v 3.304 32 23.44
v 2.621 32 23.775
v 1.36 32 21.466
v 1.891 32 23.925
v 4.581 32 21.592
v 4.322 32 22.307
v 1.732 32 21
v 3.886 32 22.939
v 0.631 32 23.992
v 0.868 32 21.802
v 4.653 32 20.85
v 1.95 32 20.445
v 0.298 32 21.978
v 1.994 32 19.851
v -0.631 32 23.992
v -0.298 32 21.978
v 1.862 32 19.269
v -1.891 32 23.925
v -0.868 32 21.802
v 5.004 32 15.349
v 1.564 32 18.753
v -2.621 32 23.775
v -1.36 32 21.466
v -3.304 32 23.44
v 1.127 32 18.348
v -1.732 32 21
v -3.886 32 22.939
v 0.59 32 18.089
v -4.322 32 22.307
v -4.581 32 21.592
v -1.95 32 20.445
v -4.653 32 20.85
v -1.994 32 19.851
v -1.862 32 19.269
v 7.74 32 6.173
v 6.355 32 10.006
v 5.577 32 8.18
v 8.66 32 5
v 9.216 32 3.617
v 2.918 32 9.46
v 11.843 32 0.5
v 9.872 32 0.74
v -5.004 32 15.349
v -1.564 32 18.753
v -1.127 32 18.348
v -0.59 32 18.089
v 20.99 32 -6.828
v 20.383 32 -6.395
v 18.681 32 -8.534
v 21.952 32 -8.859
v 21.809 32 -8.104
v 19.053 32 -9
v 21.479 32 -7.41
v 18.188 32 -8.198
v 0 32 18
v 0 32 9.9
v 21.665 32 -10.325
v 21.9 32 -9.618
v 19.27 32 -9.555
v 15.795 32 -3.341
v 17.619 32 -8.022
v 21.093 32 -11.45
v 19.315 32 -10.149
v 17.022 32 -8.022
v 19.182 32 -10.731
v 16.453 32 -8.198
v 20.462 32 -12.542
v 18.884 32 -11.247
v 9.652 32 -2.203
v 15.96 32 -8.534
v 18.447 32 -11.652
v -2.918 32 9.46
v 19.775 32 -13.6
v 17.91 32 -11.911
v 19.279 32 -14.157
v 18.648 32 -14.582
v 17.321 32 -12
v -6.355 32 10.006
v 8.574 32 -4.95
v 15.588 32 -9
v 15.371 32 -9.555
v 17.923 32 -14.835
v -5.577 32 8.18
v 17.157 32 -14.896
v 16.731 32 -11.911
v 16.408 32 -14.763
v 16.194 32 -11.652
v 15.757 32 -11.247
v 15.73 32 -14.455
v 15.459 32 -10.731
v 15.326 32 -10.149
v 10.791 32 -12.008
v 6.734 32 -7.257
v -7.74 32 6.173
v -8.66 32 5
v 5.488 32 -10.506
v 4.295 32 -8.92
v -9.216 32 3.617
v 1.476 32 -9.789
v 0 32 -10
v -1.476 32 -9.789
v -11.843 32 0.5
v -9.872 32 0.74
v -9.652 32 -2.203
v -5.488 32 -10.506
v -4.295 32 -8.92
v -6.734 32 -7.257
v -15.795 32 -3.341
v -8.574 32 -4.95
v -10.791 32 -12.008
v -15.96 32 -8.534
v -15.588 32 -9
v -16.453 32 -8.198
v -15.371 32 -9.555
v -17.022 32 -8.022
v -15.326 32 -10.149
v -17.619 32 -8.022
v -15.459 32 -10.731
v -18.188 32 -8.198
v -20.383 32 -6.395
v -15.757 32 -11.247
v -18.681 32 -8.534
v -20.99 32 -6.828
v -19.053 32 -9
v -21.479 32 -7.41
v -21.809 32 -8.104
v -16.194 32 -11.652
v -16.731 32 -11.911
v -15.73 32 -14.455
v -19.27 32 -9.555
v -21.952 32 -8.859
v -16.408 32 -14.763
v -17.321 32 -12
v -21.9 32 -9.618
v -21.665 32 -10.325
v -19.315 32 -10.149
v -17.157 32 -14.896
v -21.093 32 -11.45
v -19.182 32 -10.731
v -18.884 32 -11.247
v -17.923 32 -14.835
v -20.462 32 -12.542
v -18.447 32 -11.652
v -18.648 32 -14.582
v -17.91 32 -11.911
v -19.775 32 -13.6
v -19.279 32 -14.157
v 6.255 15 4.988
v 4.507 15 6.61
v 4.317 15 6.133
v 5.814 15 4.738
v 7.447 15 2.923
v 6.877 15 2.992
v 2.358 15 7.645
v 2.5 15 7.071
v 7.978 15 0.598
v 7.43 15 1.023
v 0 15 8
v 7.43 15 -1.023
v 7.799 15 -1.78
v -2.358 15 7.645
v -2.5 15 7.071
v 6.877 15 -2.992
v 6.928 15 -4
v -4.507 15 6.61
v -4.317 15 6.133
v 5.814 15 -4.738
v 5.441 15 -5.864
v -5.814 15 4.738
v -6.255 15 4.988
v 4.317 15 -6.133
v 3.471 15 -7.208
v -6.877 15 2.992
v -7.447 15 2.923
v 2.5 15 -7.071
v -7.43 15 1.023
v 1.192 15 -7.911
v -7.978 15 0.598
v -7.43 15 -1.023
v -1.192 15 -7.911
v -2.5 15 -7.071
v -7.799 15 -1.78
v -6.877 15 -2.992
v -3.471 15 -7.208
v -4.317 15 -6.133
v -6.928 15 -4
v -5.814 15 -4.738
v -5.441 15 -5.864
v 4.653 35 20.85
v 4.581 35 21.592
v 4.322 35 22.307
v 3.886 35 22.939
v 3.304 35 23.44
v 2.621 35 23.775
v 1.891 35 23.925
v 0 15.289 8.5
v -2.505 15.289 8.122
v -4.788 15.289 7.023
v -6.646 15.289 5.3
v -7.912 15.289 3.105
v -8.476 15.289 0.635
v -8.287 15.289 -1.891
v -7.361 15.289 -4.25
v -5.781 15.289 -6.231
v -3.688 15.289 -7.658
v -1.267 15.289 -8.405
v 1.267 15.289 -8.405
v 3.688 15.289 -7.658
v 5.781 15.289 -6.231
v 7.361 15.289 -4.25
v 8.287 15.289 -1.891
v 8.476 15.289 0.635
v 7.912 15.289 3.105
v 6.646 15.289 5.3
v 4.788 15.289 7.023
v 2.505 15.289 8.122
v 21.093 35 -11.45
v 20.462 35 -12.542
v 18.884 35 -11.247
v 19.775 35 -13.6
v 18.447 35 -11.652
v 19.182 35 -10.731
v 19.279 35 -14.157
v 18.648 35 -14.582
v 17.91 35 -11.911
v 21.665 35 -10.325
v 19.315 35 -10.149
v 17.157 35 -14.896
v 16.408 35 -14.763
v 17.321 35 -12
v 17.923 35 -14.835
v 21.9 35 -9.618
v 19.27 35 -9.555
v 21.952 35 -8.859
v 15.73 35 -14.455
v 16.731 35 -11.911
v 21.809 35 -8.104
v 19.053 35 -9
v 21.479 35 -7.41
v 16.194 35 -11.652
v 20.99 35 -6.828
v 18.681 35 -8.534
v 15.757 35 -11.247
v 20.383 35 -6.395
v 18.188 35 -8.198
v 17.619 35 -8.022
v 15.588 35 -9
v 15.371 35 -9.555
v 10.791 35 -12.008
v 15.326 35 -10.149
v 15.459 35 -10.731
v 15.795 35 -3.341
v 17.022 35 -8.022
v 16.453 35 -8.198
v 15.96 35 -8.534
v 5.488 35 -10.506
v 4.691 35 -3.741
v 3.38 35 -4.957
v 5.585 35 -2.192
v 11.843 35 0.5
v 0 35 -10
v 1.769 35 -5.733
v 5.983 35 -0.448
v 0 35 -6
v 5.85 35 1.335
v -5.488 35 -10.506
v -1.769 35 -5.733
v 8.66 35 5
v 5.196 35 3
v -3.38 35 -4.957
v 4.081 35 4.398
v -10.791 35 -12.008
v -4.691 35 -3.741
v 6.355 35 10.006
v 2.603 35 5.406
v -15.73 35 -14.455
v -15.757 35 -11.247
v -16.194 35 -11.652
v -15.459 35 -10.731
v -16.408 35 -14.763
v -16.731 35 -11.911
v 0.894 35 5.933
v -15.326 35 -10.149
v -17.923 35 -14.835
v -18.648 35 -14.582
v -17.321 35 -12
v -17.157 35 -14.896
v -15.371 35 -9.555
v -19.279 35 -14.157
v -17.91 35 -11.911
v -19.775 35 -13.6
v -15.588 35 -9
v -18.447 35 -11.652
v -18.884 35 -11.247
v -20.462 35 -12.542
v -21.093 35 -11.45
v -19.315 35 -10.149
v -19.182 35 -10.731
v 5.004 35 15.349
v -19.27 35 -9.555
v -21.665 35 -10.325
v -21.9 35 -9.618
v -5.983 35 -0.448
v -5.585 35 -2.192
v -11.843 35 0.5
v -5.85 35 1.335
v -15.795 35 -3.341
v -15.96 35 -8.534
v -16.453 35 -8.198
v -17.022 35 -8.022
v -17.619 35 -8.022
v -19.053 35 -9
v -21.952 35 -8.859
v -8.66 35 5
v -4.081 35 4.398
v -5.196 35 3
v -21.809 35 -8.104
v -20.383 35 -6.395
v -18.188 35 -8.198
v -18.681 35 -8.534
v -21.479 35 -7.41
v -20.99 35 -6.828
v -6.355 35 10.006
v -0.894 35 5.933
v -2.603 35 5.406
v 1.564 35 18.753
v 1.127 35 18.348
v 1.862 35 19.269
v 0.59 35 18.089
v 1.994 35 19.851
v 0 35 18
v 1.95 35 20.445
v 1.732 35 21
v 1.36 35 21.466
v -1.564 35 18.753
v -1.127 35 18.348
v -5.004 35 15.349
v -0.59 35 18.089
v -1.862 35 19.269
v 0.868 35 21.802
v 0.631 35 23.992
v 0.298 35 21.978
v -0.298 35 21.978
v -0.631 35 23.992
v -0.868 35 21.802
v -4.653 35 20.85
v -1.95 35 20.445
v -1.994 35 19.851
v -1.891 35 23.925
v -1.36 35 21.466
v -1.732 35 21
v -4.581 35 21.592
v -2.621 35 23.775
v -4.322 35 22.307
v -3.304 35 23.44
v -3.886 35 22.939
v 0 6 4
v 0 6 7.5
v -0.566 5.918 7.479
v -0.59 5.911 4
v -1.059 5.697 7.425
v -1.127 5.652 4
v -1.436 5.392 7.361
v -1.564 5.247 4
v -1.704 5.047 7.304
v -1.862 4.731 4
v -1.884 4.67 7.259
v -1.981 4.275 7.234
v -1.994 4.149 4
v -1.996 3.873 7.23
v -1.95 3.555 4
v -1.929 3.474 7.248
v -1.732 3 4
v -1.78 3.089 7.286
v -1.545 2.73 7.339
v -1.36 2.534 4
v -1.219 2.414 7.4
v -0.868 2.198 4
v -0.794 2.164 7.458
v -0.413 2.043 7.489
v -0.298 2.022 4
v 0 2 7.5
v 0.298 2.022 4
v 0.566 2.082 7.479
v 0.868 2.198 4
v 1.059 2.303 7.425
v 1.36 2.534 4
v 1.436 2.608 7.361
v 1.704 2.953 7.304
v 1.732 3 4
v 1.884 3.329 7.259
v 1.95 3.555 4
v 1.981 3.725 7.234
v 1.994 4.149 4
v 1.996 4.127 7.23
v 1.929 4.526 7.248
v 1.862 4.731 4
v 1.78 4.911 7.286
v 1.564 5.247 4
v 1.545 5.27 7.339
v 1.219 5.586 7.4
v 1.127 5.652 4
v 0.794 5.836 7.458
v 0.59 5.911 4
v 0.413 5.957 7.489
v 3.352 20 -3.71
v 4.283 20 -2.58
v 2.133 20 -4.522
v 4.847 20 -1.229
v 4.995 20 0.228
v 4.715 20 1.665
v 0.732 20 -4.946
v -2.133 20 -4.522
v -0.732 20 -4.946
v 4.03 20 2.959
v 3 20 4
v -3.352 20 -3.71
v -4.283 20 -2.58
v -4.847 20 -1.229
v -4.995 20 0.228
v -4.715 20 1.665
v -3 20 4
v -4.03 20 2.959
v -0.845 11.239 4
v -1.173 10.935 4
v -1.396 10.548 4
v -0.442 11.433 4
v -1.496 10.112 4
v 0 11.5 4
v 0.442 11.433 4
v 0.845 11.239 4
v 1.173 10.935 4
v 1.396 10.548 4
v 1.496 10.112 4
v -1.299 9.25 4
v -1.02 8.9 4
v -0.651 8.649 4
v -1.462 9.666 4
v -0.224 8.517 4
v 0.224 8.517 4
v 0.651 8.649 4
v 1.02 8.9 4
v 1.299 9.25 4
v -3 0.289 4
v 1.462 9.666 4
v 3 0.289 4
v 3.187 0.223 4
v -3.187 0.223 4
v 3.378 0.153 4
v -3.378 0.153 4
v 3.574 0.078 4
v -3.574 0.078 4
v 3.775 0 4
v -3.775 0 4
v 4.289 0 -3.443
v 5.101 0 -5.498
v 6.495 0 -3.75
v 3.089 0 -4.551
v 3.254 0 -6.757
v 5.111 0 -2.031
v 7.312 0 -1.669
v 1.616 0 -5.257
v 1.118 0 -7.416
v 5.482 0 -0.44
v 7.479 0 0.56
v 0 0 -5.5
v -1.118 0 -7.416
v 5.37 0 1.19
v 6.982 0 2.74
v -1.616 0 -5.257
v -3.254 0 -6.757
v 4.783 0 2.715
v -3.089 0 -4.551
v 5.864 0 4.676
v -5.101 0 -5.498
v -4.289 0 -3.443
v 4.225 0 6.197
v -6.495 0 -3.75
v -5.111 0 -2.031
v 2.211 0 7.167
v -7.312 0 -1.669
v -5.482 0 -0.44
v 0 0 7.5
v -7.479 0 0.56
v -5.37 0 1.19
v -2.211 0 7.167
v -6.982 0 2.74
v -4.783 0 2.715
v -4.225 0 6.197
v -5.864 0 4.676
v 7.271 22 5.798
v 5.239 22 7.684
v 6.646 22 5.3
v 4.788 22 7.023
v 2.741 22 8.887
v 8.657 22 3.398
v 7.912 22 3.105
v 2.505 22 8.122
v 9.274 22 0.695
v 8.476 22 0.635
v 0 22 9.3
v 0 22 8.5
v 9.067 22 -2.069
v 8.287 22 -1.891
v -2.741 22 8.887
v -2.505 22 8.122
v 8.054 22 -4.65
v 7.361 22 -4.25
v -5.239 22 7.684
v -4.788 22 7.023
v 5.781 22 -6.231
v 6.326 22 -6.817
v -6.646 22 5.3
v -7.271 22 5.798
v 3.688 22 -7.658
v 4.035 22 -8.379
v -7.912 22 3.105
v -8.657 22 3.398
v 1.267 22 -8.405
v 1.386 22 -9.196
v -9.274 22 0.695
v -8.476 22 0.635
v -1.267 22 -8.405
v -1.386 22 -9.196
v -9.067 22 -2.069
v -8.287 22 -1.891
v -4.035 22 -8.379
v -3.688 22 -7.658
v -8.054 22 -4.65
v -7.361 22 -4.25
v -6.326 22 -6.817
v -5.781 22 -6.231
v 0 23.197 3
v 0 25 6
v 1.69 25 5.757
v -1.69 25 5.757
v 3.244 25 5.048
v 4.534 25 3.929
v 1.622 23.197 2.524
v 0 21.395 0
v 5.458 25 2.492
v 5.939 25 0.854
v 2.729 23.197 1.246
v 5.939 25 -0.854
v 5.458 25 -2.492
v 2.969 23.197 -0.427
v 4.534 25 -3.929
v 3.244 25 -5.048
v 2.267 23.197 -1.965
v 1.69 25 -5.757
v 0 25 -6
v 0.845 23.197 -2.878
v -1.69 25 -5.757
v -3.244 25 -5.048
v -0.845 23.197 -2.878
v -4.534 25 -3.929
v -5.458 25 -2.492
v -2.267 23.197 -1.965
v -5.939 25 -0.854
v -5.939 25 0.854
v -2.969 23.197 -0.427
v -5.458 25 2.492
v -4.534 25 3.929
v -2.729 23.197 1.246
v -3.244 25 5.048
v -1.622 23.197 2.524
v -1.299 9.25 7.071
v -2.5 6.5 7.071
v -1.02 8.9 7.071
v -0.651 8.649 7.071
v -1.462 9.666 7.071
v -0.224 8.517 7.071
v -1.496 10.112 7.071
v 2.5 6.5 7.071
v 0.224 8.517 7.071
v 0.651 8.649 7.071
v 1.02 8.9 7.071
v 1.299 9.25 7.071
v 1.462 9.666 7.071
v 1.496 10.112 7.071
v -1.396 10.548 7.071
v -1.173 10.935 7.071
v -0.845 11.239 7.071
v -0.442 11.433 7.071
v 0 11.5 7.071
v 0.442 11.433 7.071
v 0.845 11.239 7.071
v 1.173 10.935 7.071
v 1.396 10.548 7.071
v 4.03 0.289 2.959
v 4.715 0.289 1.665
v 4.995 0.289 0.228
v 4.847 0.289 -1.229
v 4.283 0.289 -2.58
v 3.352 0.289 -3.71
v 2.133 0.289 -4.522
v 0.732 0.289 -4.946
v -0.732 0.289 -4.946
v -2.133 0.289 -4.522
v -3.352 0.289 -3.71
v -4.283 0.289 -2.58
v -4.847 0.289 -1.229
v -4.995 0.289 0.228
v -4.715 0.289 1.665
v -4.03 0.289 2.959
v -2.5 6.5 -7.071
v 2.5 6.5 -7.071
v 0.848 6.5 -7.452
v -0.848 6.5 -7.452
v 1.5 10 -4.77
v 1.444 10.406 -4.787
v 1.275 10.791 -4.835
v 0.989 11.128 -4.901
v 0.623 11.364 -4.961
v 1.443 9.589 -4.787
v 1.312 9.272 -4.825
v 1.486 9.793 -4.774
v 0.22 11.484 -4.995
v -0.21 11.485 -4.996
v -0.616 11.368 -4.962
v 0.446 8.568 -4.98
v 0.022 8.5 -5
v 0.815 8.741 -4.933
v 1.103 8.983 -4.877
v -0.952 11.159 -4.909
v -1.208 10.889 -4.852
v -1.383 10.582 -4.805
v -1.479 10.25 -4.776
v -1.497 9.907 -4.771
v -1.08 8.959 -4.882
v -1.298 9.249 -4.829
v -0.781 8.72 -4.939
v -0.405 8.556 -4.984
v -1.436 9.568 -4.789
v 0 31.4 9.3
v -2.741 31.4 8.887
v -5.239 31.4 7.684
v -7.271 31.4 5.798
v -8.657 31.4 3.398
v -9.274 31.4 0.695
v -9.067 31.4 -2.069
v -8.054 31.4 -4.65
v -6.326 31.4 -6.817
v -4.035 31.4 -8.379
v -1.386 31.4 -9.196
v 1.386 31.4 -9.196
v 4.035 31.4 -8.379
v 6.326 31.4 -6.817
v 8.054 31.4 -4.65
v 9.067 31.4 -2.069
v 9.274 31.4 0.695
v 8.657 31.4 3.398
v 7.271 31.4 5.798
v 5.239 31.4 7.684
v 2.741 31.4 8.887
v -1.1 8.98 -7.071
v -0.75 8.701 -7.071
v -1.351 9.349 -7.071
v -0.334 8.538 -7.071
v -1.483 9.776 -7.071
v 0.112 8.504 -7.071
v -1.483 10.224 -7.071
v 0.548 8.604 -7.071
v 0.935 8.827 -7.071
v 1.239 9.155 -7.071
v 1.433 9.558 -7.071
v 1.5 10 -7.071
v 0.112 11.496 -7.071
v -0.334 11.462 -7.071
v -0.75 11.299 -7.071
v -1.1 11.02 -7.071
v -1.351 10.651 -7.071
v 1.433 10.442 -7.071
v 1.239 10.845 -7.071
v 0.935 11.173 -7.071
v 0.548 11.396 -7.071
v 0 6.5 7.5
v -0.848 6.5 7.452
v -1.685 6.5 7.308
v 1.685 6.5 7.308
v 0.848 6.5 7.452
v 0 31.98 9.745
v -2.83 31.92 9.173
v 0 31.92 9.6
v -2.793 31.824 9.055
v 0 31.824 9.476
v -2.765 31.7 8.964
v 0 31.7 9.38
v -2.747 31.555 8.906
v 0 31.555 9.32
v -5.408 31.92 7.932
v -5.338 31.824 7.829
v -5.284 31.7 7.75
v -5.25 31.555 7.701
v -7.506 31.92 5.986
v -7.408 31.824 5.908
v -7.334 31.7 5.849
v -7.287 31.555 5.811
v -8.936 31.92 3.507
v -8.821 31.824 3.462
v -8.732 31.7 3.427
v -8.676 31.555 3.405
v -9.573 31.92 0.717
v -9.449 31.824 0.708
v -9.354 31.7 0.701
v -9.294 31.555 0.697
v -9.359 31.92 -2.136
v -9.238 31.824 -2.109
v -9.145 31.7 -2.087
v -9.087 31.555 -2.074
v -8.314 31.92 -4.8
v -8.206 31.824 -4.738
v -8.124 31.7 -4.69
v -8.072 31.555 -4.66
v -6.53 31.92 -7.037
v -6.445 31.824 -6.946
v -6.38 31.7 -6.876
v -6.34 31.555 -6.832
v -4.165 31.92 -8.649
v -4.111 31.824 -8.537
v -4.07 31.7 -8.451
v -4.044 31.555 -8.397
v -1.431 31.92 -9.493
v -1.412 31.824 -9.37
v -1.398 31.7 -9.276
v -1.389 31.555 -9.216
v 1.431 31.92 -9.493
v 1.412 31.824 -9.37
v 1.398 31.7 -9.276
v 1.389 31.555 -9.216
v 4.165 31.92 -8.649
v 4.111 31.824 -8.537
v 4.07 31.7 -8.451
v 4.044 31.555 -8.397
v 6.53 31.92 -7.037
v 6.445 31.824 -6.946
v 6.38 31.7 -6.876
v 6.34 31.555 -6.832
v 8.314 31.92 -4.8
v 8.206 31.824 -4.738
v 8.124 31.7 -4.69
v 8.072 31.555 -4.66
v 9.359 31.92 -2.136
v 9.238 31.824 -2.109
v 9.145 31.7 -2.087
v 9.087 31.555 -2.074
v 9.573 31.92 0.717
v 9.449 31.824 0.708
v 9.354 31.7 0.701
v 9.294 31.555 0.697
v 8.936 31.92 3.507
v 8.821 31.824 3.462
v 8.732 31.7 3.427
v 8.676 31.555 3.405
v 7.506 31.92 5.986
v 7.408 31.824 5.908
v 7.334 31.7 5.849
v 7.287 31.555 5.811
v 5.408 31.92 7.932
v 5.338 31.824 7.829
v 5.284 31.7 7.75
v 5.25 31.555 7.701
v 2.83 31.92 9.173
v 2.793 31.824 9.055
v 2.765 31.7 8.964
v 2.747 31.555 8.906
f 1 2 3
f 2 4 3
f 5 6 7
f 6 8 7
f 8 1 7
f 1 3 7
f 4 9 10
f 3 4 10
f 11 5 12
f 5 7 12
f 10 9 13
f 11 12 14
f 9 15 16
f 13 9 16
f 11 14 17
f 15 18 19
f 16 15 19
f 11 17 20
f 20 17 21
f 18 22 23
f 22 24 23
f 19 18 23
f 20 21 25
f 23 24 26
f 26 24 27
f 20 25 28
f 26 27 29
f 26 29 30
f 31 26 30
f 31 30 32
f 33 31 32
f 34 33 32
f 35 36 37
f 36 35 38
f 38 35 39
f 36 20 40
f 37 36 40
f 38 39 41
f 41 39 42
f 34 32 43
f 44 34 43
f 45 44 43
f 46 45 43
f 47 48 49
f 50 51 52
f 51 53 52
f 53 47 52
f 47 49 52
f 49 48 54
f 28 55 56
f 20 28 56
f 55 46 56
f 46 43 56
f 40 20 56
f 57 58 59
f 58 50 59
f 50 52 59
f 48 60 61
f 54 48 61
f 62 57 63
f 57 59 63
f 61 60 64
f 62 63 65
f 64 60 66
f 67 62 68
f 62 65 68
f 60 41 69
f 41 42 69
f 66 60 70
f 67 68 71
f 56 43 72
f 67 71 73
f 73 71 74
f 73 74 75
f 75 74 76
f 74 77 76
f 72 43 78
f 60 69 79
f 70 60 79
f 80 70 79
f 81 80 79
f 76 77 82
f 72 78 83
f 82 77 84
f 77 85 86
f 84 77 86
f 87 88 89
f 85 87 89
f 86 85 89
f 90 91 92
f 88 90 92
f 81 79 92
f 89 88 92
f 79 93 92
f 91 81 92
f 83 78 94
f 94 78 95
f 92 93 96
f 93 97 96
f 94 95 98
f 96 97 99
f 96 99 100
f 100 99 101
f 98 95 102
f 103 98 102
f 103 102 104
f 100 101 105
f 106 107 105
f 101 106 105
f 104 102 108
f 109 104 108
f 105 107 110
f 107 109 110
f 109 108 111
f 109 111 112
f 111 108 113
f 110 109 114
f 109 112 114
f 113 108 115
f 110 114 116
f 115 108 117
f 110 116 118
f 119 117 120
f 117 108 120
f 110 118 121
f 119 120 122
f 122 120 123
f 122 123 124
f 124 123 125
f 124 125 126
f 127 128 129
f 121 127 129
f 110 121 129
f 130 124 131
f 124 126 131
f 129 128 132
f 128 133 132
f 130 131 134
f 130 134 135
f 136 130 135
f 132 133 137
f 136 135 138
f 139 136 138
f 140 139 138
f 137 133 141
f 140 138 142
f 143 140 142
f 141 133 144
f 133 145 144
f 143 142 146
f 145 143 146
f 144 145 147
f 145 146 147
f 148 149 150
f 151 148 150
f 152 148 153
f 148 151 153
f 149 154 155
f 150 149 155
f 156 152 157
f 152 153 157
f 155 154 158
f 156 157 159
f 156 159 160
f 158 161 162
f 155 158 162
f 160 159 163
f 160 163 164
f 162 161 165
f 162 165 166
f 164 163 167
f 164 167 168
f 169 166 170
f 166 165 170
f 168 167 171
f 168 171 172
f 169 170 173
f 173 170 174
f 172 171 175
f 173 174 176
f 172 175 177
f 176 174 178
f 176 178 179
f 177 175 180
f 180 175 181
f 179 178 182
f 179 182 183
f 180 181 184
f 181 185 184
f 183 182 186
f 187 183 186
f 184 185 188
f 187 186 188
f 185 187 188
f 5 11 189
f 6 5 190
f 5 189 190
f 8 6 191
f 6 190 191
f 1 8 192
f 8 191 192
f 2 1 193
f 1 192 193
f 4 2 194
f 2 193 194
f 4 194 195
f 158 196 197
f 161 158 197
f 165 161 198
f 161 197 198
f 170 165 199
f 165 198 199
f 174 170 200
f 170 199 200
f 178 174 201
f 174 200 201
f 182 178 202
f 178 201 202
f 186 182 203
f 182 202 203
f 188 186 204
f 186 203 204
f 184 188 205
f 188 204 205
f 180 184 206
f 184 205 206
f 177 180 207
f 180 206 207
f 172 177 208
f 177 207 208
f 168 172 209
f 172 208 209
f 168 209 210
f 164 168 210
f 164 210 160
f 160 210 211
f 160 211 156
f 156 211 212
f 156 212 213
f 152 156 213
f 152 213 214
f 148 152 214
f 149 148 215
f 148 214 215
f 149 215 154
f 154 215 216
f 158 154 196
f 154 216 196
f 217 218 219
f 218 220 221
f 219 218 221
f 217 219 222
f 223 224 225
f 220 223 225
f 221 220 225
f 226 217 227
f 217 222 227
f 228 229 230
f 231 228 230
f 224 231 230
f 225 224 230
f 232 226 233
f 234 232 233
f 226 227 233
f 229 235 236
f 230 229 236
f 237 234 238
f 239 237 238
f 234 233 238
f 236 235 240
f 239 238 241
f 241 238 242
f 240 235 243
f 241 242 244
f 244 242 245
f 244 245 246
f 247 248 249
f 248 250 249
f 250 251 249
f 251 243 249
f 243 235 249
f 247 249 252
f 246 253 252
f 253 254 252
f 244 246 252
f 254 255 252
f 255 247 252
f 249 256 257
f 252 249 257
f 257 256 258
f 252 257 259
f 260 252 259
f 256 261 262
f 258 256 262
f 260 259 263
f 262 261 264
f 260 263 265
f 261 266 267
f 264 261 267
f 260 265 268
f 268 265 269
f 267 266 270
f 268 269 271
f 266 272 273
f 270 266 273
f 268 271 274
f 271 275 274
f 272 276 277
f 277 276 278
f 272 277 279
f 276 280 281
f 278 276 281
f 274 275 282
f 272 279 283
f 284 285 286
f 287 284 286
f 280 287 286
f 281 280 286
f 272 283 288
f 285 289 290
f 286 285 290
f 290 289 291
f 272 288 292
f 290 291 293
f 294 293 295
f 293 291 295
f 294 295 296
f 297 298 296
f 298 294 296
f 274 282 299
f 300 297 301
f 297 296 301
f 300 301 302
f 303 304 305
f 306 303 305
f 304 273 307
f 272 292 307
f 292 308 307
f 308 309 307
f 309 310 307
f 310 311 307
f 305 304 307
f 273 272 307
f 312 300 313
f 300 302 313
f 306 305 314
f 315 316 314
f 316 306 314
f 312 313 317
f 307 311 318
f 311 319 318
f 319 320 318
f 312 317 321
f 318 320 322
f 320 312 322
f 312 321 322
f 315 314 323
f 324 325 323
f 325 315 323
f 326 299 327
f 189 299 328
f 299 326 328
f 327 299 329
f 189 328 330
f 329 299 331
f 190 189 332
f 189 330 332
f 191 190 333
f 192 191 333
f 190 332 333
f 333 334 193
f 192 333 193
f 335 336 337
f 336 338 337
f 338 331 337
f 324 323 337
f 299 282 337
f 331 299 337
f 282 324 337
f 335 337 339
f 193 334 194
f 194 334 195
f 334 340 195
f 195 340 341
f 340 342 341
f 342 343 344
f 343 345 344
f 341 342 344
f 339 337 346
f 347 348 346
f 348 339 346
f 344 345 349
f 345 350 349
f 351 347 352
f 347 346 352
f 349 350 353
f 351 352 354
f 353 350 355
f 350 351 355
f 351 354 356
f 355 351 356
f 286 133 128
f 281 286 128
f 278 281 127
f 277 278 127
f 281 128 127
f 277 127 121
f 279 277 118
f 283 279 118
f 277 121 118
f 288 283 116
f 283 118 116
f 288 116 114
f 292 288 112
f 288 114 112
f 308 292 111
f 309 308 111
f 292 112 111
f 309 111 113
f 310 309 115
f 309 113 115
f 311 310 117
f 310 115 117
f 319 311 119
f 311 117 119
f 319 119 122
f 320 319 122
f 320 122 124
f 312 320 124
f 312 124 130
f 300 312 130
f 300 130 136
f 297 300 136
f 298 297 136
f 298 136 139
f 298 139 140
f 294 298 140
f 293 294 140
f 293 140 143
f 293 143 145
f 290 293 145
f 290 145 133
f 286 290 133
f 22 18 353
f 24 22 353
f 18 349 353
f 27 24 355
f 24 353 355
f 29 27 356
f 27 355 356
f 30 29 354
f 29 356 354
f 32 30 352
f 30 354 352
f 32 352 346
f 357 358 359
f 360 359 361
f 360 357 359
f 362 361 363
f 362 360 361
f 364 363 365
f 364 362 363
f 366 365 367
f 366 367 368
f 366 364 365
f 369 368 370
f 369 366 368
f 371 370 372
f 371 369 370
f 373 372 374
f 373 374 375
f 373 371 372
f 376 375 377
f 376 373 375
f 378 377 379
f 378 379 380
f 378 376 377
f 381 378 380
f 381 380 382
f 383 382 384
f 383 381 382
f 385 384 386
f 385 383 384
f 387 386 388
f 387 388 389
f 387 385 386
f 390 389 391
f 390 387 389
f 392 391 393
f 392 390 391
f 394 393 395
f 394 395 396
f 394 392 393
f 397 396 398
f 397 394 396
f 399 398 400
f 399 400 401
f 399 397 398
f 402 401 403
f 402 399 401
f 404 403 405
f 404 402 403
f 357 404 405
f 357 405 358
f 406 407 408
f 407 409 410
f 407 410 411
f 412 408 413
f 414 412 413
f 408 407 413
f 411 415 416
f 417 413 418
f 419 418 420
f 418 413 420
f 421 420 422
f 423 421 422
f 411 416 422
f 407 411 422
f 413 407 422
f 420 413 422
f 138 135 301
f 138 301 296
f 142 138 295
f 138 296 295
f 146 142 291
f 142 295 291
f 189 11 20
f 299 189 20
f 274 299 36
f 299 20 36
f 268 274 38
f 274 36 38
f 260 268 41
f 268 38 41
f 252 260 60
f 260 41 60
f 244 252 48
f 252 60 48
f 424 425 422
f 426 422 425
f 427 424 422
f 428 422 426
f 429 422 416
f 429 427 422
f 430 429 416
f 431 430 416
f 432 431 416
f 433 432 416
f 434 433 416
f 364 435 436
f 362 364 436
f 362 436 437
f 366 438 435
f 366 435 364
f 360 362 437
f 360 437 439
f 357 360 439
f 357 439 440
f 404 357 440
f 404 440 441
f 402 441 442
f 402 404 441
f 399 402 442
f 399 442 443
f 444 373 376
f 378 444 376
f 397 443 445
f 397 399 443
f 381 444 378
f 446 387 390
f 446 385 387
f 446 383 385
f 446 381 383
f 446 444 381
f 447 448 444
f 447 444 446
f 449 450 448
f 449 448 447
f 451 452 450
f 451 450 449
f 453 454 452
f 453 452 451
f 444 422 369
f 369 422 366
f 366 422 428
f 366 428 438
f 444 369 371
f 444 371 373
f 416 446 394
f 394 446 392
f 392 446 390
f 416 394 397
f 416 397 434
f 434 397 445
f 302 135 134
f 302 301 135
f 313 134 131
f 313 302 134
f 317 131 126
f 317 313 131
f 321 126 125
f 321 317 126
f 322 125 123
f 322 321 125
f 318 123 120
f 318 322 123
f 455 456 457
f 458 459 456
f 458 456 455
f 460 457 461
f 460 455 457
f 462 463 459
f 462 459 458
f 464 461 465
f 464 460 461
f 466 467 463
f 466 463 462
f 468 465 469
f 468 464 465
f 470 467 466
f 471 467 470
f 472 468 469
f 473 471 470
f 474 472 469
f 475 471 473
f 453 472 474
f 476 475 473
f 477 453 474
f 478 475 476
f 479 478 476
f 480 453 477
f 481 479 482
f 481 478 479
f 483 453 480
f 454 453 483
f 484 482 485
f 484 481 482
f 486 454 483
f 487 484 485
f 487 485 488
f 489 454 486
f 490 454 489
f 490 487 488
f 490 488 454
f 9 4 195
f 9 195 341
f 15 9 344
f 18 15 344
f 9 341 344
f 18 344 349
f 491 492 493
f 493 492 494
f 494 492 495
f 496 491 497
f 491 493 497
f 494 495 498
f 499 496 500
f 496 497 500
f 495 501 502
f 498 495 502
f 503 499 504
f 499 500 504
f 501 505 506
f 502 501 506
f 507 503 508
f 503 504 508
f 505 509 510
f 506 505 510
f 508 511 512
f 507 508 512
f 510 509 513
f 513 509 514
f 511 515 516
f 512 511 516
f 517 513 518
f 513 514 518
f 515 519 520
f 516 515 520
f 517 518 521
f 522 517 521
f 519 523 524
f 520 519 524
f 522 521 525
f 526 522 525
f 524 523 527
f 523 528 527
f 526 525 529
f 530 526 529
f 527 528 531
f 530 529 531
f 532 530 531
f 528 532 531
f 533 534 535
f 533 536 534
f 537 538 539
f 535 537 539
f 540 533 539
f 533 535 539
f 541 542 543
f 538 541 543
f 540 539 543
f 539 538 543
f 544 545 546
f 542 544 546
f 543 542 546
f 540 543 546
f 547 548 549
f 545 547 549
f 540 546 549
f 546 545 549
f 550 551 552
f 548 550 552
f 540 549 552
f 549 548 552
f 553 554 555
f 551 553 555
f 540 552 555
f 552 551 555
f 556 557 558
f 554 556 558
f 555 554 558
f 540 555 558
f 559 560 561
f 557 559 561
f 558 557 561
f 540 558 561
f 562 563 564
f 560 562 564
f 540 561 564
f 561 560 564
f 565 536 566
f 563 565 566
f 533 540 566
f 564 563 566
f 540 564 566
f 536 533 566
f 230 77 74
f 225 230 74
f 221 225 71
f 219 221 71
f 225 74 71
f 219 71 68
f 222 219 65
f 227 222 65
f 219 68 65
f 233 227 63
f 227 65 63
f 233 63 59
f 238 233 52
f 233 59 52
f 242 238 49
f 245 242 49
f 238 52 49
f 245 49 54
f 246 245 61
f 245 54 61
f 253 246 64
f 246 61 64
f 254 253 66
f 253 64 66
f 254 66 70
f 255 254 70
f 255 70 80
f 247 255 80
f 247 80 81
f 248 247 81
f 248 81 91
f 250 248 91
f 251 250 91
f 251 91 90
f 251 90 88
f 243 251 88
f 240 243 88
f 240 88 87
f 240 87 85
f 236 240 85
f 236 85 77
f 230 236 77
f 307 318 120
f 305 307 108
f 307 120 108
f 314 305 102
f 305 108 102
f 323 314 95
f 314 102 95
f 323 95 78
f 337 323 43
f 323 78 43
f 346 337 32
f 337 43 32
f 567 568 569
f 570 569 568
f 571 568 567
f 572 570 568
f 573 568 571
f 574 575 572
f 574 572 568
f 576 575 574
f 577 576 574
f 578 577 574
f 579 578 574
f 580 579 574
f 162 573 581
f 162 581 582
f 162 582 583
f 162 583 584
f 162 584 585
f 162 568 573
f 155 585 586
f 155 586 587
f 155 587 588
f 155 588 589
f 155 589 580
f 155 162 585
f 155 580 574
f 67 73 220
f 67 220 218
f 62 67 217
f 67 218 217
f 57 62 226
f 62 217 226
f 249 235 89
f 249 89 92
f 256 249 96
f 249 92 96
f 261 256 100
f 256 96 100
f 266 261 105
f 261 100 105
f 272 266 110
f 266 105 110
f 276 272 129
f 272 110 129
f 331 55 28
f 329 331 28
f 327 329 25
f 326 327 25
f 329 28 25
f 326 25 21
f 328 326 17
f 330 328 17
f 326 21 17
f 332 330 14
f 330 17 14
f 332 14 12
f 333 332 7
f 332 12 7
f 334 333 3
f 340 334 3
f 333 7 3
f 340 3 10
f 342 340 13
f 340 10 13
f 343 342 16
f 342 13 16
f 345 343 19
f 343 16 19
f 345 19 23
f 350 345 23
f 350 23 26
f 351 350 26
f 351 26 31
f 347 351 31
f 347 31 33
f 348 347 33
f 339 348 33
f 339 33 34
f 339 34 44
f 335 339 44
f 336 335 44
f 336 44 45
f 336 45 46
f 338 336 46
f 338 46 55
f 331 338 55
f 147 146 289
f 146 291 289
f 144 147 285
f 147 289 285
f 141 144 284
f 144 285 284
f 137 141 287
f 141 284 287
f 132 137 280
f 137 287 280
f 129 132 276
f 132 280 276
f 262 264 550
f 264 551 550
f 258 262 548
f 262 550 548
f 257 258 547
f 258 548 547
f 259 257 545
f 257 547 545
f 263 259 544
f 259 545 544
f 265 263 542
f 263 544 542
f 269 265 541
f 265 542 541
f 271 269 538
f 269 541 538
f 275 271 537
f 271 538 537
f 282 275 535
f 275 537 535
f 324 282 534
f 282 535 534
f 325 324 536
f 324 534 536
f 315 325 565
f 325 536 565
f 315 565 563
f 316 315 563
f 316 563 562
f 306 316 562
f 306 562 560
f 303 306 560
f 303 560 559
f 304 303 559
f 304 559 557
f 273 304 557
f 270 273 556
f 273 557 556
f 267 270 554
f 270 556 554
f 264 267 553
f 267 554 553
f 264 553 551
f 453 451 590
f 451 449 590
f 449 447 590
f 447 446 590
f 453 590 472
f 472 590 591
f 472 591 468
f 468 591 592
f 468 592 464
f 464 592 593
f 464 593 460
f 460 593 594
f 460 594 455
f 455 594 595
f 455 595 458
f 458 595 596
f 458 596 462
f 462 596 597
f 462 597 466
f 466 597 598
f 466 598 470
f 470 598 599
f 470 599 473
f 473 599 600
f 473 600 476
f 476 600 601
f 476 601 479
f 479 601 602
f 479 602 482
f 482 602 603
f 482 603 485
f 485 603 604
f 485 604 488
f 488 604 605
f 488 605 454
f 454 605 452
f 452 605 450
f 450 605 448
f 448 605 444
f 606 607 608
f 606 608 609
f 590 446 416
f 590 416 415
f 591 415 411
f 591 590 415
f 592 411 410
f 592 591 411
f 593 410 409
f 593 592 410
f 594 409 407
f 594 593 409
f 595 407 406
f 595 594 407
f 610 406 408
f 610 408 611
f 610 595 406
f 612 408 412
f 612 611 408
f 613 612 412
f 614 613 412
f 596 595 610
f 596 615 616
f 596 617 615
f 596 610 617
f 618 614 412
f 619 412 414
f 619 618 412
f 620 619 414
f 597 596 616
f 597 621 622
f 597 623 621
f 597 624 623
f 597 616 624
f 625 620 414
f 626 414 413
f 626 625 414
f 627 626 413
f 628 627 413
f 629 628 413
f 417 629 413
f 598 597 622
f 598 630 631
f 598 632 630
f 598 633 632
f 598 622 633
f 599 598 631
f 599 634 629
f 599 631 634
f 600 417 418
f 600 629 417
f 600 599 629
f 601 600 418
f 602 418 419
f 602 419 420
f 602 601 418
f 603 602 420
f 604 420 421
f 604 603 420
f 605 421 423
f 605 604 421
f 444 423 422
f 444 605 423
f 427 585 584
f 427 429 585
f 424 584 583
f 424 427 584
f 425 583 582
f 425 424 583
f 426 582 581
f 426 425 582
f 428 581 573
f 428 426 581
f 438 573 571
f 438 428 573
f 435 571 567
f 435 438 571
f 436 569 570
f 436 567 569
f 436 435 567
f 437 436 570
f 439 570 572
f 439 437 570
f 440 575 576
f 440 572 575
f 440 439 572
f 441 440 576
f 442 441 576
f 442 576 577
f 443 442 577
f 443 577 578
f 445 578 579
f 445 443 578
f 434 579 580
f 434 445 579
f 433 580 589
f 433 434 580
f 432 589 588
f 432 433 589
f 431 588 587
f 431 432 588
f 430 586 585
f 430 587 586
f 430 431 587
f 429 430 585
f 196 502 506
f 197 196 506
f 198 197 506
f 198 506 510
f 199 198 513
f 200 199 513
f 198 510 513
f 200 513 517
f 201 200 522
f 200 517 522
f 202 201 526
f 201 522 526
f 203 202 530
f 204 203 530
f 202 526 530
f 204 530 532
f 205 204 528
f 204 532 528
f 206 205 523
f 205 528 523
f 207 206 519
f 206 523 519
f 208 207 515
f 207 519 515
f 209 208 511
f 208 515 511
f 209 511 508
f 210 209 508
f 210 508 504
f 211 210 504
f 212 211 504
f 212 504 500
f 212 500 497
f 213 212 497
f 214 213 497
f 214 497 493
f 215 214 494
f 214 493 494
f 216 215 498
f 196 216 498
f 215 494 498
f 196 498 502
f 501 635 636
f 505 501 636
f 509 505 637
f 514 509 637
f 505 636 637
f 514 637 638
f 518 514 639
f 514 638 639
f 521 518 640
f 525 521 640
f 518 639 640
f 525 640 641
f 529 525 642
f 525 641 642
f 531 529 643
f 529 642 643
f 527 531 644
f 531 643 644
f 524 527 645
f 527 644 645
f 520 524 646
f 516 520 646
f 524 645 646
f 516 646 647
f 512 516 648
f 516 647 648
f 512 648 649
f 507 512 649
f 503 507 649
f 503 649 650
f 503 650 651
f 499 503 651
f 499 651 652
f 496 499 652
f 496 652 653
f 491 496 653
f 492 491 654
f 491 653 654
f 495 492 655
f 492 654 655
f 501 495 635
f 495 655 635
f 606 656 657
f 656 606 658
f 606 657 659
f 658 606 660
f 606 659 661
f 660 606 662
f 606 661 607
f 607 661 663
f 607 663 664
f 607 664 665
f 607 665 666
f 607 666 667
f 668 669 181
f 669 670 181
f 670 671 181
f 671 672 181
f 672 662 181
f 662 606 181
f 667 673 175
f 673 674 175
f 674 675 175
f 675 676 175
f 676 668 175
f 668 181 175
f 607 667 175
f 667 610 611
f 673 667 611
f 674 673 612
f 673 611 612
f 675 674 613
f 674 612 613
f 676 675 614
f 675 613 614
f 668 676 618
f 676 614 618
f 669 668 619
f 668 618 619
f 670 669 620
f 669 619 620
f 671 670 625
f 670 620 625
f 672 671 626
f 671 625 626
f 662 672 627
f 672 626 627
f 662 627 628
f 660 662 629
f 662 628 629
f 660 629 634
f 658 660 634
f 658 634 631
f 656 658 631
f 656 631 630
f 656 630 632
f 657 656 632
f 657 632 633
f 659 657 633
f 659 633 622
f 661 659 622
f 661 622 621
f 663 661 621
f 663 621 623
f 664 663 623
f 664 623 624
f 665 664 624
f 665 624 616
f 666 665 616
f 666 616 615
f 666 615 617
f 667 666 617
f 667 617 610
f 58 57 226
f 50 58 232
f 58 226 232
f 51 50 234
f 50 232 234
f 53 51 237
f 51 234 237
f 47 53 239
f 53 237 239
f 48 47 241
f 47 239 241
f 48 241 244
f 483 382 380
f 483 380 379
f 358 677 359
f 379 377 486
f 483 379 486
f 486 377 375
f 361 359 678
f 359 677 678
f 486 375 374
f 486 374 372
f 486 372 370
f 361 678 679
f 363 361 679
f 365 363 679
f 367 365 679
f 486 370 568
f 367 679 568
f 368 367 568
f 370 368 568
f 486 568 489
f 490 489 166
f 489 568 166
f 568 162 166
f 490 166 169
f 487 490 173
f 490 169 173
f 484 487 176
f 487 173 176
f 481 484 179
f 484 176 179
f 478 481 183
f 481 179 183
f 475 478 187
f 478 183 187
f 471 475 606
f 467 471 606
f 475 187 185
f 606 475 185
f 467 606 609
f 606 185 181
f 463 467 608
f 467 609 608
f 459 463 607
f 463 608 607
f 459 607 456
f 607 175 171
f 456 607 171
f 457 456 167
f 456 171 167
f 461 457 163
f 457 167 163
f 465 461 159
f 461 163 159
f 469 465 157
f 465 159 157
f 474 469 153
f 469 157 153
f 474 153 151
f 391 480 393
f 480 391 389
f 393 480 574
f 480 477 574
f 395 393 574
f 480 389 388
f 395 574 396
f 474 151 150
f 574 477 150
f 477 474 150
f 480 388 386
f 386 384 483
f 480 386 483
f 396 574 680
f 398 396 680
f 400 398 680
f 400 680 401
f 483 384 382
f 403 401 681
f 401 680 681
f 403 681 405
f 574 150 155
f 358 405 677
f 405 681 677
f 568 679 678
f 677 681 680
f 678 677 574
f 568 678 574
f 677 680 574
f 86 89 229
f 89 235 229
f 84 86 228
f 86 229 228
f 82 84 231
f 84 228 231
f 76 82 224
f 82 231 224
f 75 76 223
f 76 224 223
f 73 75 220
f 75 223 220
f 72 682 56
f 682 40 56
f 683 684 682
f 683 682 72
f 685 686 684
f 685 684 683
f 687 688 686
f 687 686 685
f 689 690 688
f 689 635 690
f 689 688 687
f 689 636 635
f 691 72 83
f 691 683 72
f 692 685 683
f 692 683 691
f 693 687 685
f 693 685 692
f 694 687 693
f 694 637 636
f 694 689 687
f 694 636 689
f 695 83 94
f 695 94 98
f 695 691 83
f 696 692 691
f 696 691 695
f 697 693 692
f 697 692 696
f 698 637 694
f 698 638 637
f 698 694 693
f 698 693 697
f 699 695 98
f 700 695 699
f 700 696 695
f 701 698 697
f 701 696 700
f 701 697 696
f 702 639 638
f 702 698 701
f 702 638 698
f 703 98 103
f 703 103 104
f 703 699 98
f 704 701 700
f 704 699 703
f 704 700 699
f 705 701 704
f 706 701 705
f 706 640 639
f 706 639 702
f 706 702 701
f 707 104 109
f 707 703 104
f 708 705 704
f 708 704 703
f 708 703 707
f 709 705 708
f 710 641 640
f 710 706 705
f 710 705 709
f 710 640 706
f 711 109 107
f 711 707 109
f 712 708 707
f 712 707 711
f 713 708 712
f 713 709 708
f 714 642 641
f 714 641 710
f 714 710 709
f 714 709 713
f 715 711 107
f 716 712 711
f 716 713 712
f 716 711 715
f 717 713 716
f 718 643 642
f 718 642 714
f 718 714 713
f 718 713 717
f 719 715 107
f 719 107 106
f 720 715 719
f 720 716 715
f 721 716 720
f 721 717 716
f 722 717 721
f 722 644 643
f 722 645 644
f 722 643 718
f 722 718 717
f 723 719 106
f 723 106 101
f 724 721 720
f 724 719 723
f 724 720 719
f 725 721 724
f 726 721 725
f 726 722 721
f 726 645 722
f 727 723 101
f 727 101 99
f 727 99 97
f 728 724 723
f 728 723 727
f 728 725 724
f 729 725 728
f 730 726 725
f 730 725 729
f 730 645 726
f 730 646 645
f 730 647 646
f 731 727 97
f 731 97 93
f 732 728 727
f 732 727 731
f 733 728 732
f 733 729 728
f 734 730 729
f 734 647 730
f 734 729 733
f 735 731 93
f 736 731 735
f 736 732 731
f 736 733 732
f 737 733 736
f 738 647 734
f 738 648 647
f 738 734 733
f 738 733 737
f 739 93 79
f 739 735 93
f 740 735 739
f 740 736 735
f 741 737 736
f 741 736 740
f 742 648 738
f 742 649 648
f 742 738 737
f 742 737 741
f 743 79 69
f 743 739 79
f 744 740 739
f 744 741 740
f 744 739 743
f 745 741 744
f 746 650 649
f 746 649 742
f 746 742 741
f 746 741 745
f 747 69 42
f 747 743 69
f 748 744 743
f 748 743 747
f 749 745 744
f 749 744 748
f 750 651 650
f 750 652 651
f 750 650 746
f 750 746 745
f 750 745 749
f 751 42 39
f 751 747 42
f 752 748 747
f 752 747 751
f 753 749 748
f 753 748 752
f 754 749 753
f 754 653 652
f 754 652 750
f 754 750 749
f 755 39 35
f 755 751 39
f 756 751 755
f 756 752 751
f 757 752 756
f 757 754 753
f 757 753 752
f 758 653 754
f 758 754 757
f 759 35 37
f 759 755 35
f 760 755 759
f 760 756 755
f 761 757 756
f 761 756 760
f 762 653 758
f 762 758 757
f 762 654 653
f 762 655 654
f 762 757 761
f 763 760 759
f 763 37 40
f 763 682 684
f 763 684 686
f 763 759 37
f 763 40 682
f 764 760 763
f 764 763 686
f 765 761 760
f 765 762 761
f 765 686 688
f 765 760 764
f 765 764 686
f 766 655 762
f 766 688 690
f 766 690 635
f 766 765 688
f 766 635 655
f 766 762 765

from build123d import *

# Parameters (mm, degrees)
CUT_EXTRUDE_1_DEPTH         = 20
SKETCH_4_R                  = 2
SKETCH_4_R_2                = 30
CUT_EXTRUDE_2_DEPTH         = 47.647615159
FILLET_1_R                  = 3
SKETCH_5_R                  = 2
SKETCH_5_R_2                = 1.5
CUT_EXTRUDE_3_DEPTH         = 20
CUT_EXTRUDE_5_DEPTH         = 8.5
SKETCH_9_R                  = 1.5
CUT_EXTRUDE_6_DEPTH         = 51.644290358
SKETCH_11_R                 = 8
CUT_EXTRUDE_8_DEPTH         = 5
HOLE_WIZARD_12_0_12_1_D     = 12
HOLE_WIZARD_12_0_12_1_DEPTH = 10
HOLE_WIZARD_12_0_12_1_TIP   = 3.605163714
FILLET_2_R                  = 0.6
CHAMFER_2_SIZE              = 0.5
CHAMFER_2_SIZE2             = 0.288675135
CHAMFER_3_SIZE              = 0.5
CHAMFER_3_SIZE2             = 0.288675135


with BuildPart() as part:
    # 草图2 → 旋转1 (revolve)
    with BuildSketch(Plane.XY, mode=Mode.PRIVATE) as revolve_1_sk:
        Polygon((-7.5, 0), (-7.5, 15), (-8.5, 15), (-8.5, 22), (-9.3, 22), (-9.3, 32), (-24, 32), (-24, 35), (-8, 35), (-8, 40), (-5, 40), (0, 40), (0, 0), (-5, 0), align=None)
    revolve(revolve_1_sk.sketch.rotate(Axis((0, 41.059829881, 0), (0, -1, 0)), 270), axis=Axis((0, 41.059829881, 0), (0, -1, 0)))

    # 草图3 → 切除-拉伸1 (cut)
    with BuildSketch(Plane.XZ):
        with BuildLine():
            Line((-3, 4), (3, 4))
            ThreePointArc((3, 4), (0, -5), (-3, 4))
        make_face()
    extrude(amount=-CUT_EXTRUDE_1_DEPTH, mode=Mode.SUBTRACT)

    # 草图4 → 切除-拉伸2 (cut, through all)
    with BuildSketch(Plane.XZ.offset(-32)):
        with Locations(Location((0, 20, 0), (0, 0, 270))):
            Circle(SKETCH_4_R)
        with Locations(Location((17.320508076, -10, 0), (0, 0, 270))):
            Circle(SKETCH_4_R)
        with Locations(Location((-17.320508076, -10, 0), (0, 0, 270))):
            Circle(SKETCH_4_R)
        with Locations((0, -40)):
            Circle(SKETCH_4_R_2)
        with Locations((-34.641016151, 20)):
            Circle(SKETCH_4_R_2)
        with Locations((34.641016151, 20)):
            Circle(SKETCH_4_R_2)
    extrude(amount=-CUT_EXTRUDE_2_DEPTH, mode=Mode.SUBTRACT)

    # 圆角1
    fillet_1_edges = [part.edges().sort_by_distance(p)[0] for p in [
        (-4.846535333, 33.5, 23.505554562),
        (-22.779675047, 33.5, -7.555554562),
        (-17.933139714, 33.5, -15.95),
        (17.933139714, 33.5, -15.95),
        (22.779675047, 33.5, -7.555554562),
        (4.846535333, 33.5, 23.505554562),
    ]]
    fillet(fillet_1_edges, radius=FILLET_1_R)

    # 草图5 → 切除-拉伸3 (cut)
    with BuildSketch(Plane.XY):
        with Locations(Location((0, 4, 0), (0, 0, 90))):
            Circle(SKETCH_5_R)
        with Locations(Location((0, 10, 0), (0, 0, 90))):
            Circle(SKETCH_5_R_2)
    extrude(amount=CUT_EXTRUDE_3_DEPTH, mode=Mode.SUBTRACT)

    # 草图8 → 切除-拉伸5 (cut)
    with BuildSketch(Plane.XZ.offset(-15)):
        with BuildLine():
            Line((-2.5, 7.071067812), (2.5, 7.071067812))
            ThreePointArc((2.5, 7.071067812), (0, 7.5), (-2.5, 7.071067812))
        make_face()
        with BuildLine():
            Line((-2.5, -7.071067812), (2.5, -7.071067812))
            ThreePointArc((2.5, -7.071067812), (0, -7.5), (-2.5, -7.071067812))
        make_face()
    extrude(amount=CUT_EXTRUDE_5_DEPTH, mode=Mode.SUBTRACT)

    # 草图9 → 切除-拉伸6 (cut, through all)
    with BuildSketch(Plane.XY.offset(7.071067812)):
        with Locations((0, 10)):
            Circle(SKETCH_9_R)
    extrude(amount=-CUT_EXTRUDE_6_DEPTH, mode=Mode.SUBTRACT)

    # 草图11 → 切除-拉伸8 (cut)
    with BuildSketch(Plane(origin=(0, 40, 0), x_dir=(1, 0, 0), z_dir=(0, 1, 0))):
        Circle(SKETCH_11_R)
    extrude(amount=-CUT_EXTRUDE_8_DEPTH, mode=Mode.SUBTRACT)

    # Ø12.0 (12) 直径孔1
    with Locations(Plane.ZX.offset(35)):
        with Locations((0, 0)):
            Hole(HOLE_WIZARD_12_0_12_1_D / 2, depth=HOLE_WIZARD_12_0_12_1_DEPTH)
            with Locations((0, 0, -(HOLE_WIZARD_12_0_12_1_DEPTH + HOLE_WIZARD_12_0_12_1_TIP / 2))):  # 118° drill point
                Cone(0, HOLE_WIZARD_12_0_12_1_D / 2, HOLE_WIZARD_12_0_12_1_TIP, mode=Mode.SUBTRACT)

    # 圆角2
    fillet_2_edges = [part.edges().sort_by_distance(p)[0] for p in [
        (0, 32, -9.3),
    ]]
    fillet(fillet_2_edges, radius=FILLET_2_R)

    # 倒角2
    chamfer_2_edges = [part.edges().sort_by_distance(p)[0] for p in [
        (0, 15, -8.5),
    ]]
    chamfer_2_side = [part.faces().sort_by_distance(p)[0] for p in [
        (-7.740416306, 15, 0),
    ]]
    chamfer(chamfer_2_edges, length=CHAMFER_2_SIZE, length2=CHAMFER_2_SIZE2, reference=chamfer_2_side[0])

    # 倒角3
    chamfer_3_edges = [part.edges().sort_by_distance(p)[0] for p in [
        (0, 0, -5),
    ]]
    chamfer_3_side = [part.faces().sort_by_distance(p)[0] for p in [
        (0, 0, -7.287867966),
    ]]
    chamfer(chamfer_3_edges, length=CHAMFER_3_SIZE, length2=CHAMFER_3_SIZE2, reference=chamfer_3_side[0])


solid = part.part
